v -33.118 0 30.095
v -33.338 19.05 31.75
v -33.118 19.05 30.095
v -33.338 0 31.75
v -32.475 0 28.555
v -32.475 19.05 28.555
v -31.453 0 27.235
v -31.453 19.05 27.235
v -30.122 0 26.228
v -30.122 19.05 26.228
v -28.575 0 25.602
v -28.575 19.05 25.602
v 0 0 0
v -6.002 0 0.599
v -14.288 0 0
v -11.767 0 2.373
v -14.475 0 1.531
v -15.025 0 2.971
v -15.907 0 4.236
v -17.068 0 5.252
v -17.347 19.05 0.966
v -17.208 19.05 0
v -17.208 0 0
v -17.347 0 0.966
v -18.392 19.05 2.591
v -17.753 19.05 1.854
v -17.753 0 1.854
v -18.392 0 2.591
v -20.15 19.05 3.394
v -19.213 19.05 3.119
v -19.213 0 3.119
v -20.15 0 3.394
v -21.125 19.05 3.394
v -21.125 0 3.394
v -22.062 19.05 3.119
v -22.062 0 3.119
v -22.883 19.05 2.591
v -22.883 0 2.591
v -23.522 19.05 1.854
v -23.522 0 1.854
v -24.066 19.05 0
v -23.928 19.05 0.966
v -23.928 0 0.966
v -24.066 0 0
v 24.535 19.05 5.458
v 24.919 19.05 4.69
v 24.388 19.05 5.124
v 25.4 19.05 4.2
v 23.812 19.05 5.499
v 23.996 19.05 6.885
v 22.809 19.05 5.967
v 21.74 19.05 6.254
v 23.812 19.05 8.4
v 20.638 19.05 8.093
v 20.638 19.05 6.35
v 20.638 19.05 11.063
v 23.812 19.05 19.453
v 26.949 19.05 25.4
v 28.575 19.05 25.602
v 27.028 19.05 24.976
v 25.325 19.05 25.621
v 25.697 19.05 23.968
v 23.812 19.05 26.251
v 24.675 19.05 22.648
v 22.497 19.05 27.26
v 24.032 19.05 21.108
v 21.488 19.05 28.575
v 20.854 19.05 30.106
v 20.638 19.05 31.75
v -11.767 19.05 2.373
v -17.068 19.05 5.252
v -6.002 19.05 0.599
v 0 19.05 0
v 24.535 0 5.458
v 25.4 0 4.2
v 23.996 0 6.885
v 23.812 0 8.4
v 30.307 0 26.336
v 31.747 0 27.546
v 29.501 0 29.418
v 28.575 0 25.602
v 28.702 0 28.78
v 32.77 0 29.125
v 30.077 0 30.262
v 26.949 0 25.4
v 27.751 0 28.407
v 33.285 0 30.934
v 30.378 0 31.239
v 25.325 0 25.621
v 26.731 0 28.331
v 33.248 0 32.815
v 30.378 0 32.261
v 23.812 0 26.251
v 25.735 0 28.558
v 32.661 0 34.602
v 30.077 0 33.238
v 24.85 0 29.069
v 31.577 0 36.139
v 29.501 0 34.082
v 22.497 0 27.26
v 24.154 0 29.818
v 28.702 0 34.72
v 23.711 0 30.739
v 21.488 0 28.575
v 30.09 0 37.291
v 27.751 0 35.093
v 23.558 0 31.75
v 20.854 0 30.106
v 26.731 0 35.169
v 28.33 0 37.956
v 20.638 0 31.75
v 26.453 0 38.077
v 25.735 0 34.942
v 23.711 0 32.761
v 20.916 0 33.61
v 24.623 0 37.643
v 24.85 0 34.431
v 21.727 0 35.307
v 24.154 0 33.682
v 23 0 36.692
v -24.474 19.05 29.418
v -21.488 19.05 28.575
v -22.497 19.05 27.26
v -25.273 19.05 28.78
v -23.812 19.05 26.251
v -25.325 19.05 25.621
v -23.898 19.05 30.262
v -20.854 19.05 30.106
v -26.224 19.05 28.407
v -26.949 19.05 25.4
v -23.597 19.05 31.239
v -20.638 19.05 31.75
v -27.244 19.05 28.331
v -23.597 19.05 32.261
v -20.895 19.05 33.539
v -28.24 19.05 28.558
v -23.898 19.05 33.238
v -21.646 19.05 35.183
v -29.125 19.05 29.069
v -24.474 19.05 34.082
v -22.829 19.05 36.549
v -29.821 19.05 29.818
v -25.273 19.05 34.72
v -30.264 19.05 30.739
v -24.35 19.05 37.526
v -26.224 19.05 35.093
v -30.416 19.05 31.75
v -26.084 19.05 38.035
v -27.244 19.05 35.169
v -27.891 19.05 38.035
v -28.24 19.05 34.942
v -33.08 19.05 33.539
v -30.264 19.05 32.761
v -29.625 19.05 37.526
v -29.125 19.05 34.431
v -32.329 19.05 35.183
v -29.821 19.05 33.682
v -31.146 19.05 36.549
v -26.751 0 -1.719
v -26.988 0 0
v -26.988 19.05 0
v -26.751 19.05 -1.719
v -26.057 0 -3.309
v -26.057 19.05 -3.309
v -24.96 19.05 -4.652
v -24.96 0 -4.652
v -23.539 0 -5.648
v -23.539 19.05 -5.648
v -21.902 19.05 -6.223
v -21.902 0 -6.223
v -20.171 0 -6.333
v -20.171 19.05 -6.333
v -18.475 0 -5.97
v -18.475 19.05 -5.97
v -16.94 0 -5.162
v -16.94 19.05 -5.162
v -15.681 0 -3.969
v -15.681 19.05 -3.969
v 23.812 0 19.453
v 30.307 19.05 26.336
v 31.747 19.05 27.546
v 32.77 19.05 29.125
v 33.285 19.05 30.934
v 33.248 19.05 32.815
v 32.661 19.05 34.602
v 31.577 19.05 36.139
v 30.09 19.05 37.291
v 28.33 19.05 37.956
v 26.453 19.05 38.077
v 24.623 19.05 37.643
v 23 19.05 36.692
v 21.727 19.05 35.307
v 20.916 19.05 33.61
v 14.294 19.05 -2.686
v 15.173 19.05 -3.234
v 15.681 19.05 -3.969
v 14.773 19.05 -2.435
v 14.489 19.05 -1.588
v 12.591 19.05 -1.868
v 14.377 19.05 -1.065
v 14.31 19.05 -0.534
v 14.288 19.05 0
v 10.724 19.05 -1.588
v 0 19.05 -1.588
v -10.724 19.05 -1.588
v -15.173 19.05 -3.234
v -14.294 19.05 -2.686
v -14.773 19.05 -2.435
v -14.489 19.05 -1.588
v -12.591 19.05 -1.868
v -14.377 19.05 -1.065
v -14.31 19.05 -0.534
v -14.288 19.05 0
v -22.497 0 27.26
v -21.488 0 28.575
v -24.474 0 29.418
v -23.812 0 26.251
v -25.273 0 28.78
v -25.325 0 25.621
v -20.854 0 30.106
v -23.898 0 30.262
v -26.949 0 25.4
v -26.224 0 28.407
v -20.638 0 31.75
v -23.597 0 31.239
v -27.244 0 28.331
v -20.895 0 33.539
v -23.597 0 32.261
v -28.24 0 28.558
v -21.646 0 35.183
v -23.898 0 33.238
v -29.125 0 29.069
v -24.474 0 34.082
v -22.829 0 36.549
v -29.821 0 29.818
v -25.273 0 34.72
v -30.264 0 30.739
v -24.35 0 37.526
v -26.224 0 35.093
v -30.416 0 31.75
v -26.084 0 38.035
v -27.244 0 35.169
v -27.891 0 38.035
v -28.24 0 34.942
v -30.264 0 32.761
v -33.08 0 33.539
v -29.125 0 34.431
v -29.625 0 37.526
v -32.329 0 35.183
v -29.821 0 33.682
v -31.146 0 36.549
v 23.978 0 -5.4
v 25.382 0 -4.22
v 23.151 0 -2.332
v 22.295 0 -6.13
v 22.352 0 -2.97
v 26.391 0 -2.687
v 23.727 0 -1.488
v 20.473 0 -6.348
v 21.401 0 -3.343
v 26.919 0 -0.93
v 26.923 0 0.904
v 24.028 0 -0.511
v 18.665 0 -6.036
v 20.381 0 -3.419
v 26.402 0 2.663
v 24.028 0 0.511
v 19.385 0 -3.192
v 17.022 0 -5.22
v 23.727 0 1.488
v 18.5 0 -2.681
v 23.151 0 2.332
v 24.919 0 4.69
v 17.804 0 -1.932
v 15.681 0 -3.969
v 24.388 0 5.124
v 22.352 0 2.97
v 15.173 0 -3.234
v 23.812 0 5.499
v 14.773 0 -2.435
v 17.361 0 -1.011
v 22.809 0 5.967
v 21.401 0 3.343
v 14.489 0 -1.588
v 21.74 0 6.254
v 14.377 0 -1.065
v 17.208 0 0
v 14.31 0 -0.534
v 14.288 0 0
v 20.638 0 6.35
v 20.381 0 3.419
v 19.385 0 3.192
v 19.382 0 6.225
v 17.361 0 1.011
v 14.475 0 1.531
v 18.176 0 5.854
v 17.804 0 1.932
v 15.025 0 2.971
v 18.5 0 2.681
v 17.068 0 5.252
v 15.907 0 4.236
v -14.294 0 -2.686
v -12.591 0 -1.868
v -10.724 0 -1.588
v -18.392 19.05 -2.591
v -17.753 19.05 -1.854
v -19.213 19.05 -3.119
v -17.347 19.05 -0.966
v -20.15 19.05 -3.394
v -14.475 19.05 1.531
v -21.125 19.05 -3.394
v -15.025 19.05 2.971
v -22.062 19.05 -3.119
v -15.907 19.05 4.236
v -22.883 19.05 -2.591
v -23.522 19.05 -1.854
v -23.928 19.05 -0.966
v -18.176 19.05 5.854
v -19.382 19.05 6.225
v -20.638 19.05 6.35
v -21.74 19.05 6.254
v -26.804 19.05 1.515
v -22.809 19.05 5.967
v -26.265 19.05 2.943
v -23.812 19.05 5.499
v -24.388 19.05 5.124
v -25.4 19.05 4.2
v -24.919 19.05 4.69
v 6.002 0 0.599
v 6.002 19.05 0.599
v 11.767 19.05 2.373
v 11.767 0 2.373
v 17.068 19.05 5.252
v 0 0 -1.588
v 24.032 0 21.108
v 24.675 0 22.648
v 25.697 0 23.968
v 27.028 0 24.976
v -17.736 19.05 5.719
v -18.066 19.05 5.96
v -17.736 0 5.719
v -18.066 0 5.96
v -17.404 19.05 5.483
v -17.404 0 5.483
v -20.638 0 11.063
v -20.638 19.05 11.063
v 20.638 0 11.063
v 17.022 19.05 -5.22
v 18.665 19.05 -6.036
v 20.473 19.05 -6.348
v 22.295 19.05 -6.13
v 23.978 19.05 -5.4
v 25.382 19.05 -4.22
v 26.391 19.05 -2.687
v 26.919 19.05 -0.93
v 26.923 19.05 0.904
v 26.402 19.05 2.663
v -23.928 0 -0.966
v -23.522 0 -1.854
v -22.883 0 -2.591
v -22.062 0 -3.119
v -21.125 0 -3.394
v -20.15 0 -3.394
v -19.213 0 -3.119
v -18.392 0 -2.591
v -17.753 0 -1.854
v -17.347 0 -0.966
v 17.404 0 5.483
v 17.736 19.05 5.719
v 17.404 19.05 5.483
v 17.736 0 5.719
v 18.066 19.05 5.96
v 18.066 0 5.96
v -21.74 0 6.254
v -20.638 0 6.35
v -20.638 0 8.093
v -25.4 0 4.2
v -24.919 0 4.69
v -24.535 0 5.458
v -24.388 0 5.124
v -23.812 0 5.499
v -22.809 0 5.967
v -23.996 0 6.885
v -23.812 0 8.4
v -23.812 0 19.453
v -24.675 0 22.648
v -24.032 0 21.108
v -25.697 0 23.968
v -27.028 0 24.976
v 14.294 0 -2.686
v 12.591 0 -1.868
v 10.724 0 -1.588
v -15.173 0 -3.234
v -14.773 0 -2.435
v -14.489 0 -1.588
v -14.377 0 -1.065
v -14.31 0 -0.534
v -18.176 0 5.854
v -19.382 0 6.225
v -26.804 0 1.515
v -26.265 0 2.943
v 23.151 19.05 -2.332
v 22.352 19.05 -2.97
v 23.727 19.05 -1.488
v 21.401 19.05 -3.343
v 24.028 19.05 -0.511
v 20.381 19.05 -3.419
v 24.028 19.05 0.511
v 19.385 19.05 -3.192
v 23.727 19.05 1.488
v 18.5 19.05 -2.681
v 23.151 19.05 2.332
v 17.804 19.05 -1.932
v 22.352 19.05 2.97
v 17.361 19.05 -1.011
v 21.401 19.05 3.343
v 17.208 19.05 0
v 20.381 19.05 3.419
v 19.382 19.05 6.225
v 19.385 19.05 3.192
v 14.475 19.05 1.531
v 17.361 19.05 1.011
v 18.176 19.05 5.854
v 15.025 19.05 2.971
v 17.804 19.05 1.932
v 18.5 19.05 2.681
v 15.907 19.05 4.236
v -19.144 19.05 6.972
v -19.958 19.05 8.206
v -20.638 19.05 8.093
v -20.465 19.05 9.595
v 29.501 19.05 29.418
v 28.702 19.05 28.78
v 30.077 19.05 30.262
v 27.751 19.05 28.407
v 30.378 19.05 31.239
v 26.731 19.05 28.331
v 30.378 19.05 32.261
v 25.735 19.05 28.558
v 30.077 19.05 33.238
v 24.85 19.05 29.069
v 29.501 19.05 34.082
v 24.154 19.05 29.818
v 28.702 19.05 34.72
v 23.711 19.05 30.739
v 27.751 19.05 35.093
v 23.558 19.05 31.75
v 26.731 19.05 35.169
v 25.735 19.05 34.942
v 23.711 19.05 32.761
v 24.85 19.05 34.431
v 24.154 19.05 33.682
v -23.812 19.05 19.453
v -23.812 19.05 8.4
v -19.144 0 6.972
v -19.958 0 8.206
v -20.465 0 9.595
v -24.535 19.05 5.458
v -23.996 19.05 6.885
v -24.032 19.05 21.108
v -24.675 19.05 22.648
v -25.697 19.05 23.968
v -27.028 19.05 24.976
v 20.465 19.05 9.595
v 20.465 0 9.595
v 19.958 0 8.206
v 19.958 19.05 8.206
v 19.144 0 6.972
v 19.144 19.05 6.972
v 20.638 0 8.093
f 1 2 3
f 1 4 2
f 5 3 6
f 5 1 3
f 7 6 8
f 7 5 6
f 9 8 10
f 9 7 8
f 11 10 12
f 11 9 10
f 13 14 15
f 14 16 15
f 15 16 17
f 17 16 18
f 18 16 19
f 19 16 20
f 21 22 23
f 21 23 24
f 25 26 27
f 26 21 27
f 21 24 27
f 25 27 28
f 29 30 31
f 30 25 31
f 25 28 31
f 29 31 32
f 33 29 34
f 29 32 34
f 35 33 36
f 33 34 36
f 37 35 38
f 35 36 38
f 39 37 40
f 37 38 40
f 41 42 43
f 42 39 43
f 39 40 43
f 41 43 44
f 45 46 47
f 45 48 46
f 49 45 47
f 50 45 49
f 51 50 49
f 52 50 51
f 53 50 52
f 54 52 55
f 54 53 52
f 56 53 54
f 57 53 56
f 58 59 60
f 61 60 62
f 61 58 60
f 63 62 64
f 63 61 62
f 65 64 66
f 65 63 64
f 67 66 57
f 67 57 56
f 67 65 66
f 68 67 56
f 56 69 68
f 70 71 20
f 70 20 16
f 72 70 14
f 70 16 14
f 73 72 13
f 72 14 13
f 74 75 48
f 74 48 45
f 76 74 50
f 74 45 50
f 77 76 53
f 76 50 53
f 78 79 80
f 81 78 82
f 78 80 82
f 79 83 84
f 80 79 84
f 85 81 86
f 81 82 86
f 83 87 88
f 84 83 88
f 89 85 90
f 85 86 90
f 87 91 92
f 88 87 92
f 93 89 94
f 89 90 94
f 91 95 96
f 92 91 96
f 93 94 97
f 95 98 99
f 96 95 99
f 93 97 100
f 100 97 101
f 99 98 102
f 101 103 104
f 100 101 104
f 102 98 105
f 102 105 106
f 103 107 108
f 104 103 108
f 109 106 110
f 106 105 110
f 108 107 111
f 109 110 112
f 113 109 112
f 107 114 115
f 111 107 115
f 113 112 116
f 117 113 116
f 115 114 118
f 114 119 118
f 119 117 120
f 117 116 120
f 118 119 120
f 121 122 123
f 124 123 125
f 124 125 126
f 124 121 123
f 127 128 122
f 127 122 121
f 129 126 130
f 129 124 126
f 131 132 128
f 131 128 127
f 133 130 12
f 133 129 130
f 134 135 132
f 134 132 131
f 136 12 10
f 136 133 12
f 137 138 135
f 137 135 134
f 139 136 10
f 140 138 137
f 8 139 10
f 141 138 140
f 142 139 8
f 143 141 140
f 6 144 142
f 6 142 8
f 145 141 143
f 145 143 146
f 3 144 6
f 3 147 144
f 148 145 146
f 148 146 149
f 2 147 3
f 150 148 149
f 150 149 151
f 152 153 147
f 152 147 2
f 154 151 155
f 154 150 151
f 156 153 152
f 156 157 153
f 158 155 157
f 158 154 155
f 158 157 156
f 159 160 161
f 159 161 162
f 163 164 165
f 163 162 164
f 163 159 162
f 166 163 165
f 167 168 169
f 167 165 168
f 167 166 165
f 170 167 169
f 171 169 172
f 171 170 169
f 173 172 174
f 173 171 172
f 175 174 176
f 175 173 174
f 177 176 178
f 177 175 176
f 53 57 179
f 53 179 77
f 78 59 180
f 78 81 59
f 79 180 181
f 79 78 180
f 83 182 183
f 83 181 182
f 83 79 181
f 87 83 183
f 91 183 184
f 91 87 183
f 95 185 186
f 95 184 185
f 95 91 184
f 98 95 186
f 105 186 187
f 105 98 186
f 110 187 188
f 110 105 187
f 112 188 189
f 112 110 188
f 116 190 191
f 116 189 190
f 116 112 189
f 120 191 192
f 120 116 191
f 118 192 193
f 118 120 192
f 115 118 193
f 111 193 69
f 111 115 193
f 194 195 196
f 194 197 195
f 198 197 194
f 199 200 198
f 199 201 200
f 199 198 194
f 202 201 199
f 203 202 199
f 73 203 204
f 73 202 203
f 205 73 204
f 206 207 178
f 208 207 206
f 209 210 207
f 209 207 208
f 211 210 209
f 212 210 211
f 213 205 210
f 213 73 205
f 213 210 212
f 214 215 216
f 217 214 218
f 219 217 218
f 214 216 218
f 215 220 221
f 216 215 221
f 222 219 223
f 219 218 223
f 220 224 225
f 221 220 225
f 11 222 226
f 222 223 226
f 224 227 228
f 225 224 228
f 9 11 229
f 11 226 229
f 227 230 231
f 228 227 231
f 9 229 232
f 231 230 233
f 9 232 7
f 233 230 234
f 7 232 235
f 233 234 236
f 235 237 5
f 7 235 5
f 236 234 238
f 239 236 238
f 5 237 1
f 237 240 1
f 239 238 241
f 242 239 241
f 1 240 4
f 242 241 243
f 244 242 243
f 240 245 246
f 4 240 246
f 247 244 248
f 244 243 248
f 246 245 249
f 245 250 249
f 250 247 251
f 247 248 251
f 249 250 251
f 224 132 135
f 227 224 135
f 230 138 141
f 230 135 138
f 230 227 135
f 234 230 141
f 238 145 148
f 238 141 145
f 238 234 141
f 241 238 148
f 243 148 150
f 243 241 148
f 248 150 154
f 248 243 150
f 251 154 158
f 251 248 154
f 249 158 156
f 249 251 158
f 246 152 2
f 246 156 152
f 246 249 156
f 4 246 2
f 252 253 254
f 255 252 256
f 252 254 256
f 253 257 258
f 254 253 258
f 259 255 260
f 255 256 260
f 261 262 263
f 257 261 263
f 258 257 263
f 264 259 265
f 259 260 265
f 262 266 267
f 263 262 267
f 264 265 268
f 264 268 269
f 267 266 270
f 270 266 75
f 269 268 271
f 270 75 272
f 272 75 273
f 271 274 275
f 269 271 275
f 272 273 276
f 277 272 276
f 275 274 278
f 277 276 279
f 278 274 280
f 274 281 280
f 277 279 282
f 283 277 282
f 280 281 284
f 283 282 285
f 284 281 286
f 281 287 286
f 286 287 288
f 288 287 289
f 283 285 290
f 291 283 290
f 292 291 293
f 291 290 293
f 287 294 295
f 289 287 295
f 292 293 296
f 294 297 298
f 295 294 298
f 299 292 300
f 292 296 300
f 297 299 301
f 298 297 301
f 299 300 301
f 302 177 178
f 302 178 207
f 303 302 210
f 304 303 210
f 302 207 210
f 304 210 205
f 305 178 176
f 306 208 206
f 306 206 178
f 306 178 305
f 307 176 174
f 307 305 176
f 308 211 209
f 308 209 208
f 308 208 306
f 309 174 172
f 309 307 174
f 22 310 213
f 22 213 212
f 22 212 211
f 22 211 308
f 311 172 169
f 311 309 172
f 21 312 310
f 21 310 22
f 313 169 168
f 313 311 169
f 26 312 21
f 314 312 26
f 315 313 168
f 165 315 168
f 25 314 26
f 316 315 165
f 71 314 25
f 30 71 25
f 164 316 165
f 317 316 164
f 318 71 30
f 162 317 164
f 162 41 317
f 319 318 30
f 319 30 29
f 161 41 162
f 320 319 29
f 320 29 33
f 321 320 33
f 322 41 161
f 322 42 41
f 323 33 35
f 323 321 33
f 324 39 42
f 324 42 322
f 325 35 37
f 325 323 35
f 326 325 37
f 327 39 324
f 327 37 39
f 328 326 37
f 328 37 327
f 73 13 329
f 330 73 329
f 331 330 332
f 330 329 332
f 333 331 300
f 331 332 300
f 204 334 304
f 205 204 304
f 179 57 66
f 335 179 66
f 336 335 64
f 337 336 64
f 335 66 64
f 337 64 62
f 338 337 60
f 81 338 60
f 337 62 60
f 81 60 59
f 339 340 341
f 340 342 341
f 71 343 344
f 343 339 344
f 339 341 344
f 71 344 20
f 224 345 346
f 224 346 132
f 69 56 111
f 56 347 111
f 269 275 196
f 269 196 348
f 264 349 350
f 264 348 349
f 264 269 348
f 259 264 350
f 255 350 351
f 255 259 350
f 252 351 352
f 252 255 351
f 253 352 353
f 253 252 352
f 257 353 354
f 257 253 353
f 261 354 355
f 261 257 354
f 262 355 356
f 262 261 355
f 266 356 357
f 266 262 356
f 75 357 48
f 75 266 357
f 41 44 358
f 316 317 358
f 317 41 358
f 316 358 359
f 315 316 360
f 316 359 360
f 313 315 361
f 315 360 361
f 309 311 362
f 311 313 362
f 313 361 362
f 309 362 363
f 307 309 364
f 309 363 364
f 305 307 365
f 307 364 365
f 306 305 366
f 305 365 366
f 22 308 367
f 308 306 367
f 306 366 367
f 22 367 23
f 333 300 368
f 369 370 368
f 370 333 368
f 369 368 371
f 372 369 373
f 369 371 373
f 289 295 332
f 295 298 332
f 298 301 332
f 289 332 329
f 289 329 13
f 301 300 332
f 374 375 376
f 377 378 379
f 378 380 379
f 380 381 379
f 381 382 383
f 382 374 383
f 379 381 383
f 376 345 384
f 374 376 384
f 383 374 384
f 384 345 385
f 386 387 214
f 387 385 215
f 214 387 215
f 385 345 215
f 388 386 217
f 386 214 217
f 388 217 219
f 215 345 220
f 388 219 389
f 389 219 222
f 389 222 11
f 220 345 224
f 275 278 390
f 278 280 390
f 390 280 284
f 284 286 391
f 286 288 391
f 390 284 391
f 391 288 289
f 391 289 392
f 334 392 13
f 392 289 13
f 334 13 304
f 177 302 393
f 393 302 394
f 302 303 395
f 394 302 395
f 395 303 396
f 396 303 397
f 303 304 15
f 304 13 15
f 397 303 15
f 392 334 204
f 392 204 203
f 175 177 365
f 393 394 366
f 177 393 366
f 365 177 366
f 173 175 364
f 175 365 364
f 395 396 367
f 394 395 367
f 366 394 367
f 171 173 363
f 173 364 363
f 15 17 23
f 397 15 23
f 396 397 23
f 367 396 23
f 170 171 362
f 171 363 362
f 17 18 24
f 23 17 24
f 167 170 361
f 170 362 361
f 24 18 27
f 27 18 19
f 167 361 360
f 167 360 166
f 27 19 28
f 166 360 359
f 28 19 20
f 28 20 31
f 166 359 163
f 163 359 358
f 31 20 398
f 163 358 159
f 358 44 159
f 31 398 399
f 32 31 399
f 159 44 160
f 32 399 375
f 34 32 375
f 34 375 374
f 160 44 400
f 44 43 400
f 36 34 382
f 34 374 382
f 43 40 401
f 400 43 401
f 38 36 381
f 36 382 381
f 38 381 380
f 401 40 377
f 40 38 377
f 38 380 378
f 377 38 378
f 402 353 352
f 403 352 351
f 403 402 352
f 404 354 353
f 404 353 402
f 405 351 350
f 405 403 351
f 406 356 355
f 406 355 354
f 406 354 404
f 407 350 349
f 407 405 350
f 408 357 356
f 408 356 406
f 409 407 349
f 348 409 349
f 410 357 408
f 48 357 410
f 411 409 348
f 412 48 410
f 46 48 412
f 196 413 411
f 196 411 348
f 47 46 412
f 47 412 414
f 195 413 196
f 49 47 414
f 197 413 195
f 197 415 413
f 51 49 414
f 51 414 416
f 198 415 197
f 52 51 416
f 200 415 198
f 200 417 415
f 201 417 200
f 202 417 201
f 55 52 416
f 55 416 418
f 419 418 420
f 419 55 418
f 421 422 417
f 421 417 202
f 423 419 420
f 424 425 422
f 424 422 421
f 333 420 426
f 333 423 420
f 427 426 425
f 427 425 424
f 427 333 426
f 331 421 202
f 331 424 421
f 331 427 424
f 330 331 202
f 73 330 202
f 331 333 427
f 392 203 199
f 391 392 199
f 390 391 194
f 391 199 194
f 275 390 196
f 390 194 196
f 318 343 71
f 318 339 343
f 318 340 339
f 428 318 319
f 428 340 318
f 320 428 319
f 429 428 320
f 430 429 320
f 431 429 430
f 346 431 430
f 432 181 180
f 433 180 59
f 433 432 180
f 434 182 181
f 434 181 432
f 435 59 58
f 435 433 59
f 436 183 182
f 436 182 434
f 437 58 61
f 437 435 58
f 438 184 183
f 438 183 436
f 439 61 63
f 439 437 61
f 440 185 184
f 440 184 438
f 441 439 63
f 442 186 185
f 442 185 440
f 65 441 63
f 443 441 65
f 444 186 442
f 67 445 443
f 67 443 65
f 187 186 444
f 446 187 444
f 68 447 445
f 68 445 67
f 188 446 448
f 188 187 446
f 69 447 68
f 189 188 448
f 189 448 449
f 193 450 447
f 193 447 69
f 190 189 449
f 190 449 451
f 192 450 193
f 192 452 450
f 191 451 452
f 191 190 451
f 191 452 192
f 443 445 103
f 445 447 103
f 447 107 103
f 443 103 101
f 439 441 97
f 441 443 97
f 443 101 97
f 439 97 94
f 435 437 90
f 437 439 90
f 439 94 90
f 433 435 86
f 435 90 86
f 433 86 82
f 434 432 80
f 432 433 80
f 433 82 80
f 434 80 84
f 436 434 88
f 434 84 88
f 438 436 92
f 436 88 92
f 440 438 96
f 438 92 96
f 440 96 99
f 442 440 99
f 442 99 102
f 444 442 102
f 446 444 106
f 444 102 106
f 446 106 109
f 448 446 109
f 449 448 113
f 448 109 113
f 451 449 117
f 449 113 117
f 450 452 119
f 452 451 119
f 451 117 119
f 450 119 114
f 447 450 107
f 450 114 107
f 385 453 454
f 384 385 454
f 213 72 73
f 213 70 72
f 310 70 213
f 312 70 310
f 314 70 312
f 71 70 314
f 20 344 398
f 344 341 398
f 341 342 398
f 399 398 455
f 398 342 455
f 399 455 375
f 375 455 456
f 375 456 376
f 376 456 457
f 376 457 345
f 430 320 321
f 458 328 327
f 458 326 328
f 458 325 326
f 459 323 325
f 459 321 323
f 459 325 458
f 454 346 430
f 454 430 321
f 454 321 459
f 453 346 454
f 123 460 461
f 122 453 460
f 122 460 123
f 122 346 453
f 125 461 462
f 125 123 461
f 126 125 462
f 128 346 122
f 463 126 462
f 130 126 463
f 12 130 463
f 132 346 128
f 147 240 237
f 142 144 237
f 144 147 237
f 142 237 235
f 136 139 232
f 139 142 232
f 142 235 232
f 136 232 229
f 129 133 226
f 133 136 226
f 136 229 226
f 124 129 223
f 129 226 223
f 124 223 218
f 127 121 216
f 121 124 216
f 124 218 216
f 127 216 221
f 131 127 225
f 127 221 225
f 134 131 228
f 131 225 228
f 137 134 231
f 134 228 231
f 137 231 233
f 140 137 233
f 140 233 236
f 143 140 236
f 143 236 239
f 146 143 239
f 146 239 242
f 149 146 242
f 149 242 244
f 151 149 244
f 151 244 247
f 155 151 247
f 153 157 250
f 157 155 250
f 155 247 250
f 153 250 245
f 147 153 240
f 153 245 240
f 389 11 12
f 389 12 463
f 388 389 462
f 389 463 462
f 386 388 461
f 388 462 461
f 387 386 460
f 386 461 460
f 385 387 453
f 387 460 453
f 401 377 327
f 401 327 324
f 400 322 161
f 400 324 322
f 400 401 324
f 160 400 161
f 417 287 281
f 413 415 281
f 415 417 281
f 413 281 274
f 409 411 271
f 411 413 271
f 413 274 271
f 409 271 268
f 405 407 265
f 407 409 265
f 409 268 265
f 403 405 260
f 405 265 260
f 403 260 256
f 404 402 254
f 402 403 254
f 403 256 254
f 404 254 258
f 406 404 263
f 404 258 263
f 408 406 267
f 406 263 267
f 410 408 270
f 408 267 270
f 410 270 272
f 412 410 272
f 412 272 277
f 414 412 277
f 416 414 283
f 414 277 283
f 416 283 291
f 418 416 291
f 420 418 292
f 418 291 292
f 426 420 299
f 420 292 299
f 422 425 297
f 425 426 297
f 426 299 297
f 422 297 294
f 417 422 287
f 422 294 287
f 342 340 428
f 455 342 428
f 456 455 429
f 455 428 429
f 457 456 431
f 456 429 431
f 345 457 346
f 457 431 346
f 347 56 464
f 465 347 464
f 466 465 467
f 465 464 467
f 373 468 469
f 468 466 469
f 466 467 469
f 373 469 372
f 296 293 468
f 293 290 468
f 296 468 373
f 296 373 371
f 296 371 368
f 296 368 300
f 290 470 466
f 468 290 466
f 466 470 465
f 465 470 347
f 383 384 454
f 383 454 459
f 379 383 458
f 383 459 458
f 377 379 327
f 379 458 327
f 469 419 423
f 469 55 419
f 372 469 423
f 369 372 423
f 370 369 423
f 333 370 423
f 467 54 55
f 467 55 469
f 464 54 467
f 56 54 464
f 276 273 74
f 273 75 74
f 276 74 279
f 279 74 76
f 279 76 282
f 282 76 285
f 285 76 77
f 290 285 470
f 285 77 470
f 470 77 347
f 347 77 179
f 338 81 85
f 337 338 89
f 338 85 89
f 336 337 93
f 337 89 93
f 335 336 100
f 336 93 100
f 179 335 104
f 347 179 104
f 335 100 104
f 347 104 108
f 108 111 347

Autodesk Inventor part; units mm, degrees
ref_plane "YZ Plane" through (0, 0, 0) normal (1, 0, 0) x (0, 1, 0)
ref_plane "XZ Plane" through (0, 0, 0) normal (0, 1, 0) x (-1, 0, 0)
ref_plane "XY Plane" through (0, 0, 0) normal (0, 0, 1) x (1, 0, 0)
sketch "Sketch1" plane through (0, 0, 0) normal (0, 1, 0) x (-1, 0, 0)
  circle A0 centre (26.9875, 31.75) radius 3.429
  line L0 (0, 0) -> (0, -38.1) construction
  circle A1 centre (26.9875, 31.75) radius 6.35
  line L1 (0, 0) -> (20.6375, 0) construction
  line L2 (20.6375, 31.75) -> (0, 31.75) construction
  line L3 (0, 31.75) -> (0, 0) construction
  circle A2 centre (20.6375, 0) radius 3.429
  circle A3 centre (20.6375, 0) radius 6.35
  line L4 (20.6375, 6.35) -> (20.6375, 31.75)
  line L5 (23.8125, 26.2507) -> (23.8125, 5.4993)
  arc A4 (0, 0) -> (20.6375, 8.0926) centre (0, 30.3609) ccw
  line L6 (0, 0) -> (20.6375, 0)
  line L7 (0, -1.5875) -> (14.4891, -1.5875)
  circle A5 centre (-26.9875, 31.75) radius 3.429
  circle A6 centre (-26.9875, 31.75) radius 6.35
  line L8 (0, 0) -> (-20.6375, 0) construction
  line L9 (-20.6375, 31.75) -> (0, 31.75) construction
  circle A7 centre (-20.6375, 0) radius 3.429
  circle A8 centre (-20.6375, 0) radius 6.35
  line L10 (-20.6375, 6.35) -> (-20.6375, 31.75)
  line L11 (-23.8125, 26.2507) -> (-23.8125, 5.4993)
  arc A9 (-20.6375, 8.0926) -> (0, 0) centre (0, 30.3609) ccw
  line L12 (0, 0) -> (-20.6375, 0)
  line L13 (0, -1.5875) -> (-14.4891, -1.5875)
  dimension "d0" = 6.858
  dimension "d1" = 38.1
  dimension "d2" = 26.9875
  dimension "d3" = 12.7
  dimension "d5" = 31.75
  dimension "d9" = 6.858
  dimension "d10" = 12.7
  dimension "d11" = 3.175
  dimension "d13" = 1.5875
extrude "Extrusion1" add sketch "Sketch1" along normal blind 19.05
fillet "Fillet1" radius 6.35 8 edges at (-20.6375, 9.525, 8.0926) (20.6375, 9.525, 8.0926) (-14.4891, 9.525, -1.5875) (14.4891, 9.525, -1.5875) (23.8125, 9.525, 5.4993) (23.8125, 9.525, 26.2507) (-23.8125, 9.525, 5.4993) (-23.8125, 9.525, 26.2507)
properties part number "Chassis"
